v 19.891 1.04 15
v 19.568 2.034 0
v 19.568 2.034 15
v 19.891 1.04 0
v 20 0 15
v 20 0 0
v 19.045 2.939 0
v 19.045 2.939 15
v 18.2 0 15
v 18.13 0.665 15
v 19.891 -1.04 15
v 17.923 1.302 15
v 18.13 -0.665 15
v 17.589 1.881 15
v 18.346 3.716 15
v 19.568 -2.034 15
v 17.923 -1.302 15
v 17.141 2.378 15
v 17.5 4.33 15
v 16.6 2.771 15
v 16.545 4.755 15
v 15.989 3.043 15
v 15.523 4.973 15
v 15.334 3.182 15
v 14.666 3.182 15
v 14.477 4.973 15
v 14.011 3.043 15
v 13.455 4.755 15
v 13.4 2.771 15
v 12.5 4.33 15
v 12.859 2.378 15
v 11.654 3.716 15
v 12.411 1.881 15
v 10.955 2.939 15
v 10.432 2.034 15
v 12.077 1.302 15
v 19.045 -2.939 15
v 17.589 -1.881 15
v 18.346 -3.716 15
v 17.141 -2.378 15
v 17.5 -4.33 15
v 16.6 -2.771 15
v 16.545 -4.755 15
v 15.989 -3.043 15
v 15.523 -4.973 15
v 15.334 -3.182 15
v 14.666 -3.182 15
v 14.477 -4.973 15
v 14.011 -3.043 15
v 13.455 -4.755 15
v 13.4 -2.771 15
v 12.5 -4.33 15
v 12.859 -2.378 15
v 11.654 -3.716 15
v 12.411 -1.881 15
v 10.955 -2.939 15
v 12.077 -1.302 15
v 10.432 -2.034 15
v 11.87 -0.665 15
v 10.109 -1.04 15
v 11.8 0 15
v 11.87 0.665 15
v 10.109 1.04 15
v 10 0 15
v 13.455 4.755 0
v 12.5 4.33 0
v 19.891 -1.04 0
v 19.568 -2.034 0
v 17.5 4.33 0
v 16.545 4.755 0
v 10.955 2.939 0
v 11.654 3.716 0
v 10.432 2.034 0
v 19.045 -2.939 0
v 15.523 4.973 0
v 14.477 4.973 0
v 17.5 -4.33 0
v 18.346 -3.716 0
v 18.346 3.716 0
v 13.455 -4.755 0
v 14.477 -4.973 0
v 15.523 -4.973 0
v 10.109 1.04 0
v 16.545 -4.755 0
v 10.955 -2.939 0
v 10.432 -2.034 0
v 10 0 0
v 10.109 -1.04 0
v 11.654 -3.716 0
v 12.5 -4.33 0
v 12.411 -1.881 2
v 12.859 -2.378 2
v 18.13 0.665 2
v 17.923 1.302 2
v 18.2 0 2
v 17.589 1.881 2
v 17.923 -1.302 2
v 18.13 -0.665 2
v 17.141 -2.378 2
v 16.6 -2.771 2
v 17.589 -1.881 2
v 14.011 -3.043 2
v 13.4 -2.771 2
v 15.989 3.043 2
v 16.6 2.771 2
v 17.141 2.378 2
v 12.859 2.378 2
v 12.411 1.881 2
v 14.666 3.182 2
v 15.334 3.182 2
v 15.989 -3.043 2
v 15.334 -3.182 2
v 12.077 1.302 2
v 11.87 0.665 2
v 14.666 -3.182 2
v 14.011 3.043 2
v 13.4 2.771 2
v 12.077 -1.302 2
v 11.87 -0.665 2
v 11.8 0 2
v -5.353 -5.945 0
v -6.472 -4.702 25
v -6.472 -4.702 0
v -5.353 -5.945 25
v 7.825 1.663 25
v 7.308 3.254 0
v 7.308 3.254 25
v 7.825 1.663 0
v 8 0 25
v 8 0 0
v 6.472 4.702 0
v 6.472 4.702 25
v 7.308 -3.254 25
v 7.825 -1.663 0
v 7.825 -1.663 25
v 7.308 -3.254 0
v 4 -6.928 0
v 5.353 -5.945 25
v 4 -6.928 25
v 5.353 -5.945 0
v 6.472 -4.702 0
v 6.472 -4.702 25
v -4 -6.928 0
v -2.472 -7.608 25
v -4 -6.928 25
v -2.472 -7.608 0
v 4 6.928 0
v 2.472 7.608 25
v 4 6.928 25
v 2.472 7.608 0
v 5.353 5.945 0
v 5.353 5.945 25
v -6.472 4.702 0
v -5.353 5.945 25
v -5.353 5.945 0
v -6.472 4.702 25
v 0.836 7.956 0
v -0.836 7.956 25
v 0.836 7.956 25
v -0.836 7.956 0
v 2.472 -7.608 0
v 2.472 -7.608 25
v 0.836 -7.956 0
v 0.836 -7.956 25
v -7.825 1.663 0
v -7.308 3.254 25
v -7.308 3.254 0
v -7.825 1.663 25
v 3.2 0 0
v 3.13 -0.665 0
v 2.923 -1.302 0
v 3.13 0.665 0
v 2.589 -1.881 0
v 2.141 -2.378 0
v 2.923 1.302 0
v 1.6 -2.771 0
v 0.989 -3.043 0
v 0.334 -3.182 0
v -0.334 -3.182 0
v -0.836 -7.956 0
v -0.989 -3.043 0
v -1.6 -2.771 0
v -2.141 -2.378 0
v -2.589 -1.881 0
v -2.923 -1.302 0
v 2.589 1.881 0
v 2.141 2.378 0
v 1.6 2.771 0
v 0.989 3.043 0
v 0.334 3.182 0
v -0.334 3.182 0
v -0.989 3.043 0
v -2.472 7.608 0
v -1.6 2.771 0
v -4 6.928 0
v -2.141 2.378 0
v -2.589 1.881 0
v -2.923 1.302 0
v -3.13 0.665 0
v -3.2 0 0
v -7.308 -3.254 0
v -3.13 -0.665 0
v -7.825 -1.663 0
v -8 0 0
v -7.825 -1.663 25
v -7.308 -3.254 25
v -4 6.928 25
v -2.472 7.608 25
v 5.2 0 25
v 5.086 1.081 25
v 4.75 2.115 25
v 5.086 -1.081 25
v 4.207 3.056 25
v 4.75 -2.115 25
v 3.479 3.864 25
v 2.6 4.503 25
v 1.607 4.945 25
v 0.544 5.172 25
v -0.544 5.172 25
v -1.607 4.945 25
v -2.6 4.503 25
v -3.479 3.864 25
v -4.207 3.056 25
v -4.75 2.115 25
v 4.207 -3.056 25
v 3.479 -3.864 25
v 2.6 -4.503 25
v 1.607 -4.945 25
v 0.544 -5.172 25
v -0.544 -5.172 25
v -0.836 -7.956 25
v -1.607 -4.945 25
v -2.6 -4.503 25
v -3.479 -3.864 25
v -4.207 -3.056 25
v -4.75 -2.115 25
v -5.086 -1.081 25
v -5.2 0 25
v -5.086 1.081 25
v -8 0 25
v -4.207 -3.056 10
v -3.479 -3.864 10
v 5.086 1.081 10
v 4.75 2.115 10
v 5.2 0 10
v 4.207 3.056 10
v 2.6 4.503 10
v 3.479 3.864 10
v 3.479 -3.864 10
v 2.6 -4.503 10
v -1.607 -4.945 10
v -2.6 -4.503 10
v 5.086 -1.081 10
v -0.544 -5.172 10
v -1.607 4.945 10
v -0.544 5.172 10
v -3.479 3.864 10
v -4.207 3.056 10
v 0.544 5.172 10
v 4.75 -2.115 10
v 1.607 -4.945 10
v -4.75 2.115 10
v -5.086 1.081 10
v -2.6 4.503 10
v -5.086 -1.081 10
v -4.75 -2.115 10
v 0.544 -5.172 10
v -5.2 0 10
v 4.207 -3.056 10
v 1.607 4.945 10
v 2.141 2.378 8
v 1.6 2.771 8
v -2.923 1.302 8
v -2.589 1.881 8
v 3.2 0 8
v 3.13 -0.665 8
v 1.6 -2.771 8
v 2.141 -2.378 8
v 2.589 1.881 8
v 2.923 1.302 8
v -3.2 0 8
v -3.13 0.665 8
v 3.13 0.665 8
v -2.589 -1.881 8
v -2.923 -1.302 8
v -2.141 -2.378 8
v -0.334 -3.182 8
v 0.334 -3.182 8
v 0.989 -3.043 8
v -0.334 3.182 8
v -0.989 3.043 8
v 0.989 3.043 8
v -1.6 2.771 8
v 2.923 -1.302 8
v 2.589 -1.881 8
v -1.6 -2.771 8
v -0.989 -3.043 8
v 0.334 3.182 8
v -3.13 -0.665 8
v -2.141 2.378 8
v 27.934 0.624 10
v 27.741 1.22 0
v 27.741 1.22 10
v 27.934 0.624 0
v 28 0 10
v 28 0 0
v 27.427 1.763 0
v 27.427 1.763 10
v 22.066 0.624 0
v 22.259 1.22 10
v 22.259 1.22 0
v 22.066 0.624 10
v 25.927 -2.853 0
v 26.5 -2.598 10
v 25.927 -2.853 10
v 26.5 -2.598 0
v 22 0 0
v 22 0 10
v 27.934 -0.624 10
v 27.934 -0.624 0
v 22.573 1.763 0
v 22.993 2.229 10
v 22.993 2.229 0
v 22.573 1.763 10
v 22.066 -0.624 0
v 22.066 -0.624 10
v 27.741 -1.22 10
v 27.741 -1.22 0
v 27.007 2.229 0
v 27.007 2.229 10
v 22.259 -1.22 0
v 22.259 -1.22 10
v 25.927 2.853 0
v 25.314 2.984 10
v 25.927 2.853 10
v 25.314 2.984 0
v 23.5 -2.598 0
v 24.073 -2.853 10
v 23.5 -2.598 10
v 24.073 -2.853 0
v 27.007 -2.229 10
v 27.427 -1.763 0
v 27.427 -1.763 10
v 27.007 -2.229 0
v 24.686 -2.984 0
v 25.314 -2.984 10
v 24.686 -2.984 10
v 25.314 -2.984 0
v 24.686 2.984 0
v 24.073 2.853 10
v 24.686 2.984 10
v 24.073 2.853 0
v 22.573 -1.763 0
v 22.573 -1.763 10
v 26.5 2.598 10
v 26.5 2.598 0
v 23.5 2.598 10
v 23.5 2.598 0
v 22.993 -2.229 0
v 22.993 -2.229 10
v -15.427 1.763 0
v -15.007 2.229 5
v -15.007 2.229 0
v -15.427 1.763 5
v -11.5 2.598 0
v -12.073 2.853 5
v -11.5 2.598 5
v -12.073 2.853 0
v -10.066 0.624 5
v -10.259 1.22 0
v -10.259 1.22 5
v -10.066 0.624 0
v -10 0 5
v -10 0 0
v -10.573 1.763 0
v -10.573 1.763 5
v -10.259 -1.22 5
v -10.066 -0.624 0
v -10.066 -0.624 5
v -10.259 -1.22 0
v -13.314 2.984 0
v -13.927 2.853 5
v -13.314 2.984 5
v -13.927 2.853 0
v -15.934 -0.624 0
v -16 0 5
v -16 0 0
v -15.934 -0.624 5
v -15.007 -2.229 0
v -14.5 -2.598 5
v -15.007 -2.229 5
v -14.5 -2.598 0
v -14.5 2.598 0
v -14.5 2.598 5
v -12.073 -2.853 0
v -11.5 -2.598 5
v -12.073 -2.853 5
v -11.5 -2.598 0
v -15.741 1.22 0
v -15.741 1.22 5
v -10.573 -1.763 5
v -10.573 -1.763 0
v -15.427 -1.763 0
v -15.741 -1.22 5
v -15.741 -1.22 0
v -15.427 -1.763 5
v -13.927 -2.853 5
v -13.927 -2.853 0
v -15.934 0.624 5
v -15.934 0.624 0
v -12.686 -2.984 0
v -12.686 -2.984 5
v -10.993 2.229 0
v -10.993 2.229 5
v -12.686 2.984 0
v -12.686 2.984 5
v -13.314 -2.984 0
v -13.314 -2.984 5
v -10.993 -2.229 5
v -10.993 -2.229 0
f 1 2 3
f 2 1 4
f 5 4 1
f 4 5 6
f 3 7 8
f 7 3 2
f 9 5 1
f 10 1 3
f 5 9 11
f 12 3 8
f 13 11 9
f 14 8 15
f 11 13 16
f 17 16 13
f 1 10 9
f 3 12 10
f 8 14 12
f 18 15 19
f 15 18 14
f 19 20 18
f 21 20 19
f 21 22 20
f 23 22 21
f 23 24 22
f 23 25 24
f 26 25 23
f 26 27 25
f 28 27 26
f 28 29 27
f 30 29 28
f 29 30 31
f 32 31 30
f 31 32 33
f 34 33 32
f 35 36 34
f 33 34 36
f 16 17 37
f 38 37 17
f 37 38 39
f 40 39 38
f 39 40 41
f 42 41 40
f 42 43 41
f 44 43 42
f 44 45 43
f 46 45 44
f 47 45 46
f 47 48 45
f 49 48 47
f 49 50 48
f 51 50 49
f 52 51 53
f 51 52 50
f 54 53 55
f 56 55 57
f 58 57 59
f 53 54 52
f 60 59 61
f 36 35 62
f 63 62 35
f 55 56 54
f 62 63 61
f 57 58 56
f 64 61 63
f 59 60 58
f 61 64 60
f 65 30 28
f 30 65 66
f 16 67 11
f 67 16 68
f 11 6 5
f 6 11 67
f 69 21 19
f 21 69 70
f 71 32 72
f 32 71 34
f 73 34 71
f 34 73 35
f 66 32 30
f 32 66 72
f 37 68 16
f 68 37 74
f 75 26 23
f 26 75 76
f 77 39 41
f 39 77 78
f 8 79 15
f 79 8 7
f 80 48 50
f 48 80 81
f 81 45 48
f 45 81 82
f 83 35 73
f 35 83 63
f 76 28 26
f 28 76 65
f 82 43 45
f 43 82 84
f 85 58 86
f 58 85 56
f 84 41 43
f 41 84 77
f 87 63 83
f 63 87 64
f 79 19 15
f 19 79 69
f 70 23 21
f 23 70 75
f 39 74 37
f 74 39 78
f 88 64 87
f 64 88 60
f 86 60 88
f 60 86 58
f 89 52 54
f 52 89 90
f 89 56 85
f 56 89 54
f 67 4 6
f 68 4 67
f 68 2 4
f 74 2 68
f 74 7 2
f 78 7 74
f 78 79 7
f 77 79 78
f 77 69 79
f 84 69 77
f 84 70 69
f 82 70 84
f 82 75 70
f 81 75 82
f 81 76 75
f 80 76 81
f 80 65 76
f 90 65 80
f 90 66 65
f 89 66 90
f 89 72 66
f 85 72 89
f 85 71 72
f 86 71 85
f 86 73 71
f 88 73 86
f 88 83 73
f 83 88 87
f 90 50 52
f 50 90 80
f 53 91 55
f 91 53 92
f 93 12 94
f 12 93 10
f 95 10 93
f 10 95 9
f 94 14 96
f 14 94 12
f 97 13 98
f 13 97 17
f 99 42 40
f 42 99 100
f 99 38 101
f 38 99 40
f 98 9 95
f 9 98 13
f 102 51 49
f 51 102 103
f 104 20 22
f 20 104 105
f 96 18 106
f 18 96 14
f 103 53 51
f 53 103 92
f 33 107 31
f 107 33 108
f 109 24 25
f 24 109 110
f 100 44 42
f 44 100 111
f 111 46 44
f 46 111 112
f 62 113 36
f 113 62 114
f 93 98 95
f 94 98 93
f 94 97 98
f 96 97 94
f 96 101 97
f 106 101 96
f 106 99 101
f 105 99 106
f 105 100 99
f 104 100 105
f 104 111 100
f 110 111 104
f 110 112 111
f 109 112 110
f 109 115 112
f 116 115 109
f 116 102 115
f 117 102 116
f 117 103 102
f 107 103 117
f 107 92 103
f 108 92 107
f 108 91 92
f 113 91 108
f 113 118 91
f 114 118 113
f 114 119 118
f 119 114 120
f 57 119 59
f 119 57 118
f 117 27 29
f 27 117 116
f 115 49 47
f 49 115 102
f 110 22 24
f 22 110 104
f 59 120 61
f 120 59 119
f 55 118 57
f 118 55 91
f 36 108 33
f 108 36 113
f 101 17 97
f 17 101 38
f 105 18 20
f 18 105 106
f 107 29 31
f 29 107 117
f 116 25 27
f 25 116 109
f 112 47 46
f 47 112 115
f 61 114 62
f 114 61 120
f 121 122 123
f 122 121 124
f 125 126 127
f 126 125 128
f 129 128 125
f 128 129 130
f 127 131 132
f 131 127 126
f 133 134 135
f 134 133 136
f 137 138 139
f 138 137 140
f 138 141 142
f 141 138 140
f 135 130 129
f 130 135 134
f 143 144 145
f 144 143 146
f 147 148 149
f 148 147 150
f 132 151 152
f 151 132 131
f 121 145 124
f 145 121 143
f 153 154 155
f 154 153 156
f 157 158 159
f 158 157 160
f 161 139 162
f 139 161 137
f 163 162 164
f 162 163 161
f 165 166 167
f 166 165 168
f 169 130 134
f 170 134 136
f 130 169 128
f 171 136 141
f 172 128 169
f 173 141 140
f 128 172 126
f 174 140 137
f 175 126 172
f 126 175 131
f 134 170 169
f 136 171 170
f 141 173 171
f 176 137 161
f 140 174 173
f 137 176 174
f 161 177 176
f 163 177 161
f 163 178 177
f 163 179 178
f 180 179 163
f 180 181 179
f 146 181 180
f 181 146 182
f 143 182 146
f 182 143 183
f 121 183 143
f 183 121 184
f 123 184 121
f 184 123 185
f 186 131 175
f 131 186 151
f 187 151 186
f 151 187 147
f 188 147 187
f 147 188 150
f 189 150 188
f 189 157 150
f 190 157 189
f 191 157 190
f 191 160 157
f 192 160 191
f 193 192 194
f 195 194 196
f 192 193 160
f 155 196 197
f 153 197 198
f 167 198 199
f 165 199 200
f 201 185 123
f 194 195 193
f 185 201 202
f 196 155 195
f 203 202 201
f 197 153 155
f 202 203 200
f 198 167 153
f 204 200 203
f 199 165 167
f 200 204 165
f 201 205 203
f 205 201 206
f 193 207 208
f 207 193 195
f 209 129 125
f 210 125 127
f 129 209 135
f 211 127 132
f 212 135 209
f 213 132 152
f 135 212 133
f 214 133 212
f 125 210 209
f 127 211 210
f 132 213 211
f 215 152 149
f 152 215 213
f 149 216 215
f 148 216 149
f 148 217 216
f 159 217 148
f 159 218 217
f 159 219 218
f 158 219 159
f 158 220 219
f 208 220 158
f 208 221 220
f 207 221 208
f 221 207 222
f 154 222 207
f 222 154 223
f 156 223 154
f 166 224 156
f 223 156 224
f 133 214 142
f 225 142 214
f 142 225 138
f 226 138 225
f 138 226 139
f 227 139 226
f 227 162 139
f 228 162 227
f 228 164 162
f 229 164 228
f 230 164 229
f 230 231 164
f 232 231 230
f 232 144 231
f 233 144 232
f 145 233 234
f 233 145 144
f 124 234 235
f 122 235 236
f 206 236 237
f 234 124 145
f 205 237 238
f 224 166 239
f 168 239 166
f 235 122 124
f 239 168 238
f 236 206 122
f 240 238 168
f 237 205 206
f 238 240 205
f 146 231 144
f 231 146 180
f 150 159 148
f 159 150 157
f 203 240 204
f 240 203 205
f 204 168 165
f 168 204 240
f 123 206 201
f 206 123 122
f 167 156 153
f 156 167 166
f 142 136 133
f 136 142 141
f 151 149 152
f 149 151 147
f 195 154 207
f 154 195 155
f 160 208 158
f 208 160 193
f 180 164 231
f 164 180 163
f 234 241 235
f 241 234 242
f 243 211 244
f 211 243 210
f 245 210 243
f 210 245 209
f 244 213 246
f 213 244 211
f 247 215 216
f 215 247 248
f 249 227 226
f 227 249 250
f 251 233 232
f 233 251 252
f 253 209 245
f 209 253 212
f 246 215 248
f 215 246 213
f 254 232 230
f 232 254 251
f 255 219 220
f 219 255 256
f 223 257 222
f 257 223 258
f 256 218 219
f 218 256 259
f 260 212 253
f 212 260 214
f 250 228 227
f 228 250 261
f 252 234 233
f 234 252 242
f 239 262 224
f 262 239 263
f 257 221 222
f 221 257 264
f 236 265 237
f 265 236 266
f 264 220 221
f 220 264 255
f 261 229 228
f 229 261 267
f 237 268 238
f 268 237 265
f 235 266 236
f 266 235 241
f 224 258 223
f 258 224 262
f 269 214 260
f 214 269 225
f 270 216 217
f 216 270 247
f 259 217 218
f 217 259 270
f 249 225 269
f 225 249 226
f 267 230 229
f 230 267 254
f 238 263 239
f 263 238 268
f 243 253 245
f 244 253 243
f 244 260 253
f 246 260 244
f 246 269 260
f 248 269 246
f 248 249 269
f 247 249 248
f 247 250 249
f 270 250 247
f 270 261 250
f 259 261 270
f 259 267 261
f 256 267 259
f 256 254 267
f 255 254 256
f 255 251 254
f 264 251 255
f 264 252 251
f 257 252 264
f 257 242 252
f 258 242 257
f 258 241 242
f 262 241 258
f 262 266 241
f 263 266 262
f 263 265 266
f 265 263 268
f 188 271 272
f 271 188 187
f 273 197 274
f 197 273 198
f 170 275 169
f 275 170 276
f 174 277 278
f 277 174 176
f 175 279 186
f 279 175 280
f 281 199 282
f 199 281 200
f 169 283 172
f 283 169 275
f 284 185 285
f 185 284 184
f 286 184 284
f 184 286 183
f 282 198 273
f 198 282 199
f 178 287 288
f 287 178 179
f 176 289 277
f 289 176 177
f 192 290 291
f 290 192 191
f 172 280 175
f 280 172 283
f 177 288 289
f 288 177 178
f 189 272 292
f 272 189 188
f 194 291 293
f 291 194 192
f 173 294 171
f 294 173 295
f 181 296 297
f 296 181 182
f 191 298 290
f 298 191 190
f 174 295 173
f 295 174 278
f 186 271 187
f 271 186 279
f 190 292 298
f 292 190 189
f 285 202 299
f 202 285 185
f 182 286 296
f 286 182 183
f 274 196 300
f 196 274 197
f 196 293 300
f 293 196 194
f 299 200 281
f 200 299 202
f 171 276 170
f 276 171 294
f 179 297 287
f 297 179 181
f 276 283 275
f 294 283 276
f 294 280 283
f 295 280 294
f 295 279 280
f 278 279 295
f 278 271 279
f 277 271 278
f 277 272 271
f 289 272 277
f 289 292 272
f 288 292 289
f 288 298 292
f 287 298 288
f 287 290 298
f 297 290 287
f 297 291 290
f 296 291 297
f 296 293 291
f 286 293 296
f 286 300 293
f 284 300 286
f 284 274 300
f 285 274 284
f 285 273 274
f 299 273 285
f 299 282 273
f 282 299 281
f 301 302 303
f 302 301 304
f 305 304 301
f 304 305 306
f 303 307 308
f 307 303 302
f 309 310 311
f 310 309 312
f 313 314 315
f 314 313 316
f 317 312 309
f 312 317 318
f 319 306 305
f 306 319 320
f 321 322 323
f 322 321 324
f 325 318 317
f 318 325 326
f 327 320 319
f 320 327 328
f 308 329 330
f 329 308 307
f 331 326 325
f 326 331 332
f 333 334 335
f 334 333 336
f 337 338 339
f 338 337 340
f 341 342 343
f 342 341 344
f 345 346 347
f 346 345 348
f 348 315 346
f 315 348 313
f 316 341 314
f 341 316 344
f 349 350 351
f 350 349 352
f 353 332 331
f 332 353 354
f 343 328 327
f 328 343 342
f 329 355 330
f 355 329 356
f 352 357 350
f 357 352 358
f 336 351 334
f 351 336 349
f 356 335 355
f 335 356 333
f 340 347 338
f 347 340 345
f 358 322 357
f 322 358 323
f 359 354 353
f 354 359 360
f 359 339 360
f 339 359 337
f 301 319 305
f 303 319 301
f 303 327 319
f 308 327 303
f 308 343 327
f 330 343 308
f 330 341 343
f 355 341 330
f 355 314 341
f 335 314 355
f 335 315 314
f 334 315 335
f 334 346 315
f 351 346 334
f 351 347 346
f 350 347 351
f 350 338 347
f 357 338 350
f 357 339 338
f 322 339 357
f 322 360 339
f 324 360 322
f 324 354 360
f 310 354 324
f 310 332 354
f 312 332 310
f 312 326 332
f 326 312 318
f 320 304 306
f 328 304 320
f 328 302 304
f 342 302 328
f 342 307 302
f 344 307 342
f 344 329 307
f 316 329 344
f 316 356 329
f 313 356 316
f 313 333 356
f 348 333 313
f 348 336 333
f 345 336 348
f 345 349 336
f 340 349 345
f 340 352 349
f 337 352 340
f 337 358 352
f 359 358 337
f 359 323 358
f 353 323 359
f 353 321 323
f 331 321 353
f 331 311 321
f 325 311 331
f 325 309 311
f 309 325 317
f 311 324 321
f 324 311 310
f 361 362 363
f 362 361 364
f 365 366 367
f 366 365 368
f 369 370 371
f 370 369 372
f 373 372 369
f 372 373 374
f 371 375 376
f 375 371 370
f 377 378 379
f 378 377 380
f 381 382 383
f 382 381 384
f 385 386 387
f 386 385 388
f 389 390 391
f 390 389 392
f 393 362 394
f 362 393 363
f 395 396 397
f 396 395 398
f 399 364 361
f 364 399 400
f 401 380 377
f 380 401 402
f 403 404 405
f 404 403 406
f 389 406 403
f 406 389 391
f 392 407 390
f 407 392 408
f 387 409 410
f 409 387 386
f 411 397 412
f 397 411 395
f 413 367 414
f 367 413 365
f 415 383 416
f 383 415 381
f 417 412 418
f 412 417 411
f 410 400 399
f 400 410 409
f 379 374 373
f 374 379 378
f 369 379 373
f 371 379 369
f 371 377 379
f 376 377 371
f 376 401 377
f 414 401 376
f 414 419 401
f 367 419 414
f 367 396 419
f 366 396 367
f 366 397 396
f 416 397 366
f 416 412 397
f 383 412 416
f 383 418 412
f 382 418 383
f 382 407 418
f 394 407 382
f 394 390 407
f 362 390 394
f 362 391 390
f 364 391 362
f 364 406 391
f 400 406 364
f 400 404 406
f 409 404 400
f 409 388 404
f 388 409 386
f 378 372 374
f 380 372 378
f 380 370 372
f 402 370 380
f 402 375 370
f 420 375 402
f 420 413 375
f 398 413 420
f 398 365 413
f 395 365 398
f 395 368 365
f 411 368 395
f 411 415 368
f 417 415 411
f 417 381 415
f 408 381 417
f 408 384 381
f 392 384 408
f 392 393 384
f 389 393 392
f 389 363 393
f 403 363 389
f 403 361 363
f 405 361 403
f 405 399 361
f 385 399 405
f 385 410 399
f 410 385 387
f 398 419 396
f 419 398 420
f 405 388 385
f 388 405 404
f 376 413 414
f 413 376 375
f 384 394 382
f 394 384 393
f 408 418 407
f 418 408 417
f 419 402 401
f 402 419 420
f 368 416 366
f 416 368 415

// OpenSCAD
// Custom magnetic spring
// By Magonegro JUL-2016
// Uses two cylindrical magnets placed in opposite magnetic orientation.
// Depending on the strength of the magnets the spring lenght may vary.
// Insert the magnets and top in the piston and holder and fix them with glue
// You have a working everlasting magnetic spring.

// Piston parameters
// Radius for the piston:
RADIUS_IN=5;
// Height of the piston:
HEIGHT_IN=15;
// Magnet height
MAGHEIGHT=3;
// Magnet radius
MAGRADIUS=3;
// Holder radius:
RADIUS_OUT=8;
// Holder height
HEIGHT_OUT=25;
// Holder base height
BASEHEIGHT_OUT=10;
// Resolution
FACETS=30;
// Tolerance (0.2mm typ)
TOLERANCE=0.2;

// Piston
translate([RADIUS_OUT+RADIUS_IN+2,0,0]) 
    {
    difference()
        {
        cylinder(r=RADIUS_IN,h=HEIGHT_IN,$fn=FACETS);
        translate([0,0,2]) cylinder(r=MAGRADIUS+TOLERANCE,h=HEIGHT_IN-2,$fn=FACETS);
        }
    }

// Part to fix the magnet to the piston
translate([RADIUS_OUT+2*RADIUS_IN+2+MAGRADIUS+2,0,0])
    {
    cylinder(r=MAGRADIUS,h=HEIGHT_IN-2-MAGHEIGHT,$fn=FACETS);
    }

// Holder
union()
{
    difference()
    {
        cylinder(r=RADIUS_OUT,h=HEIGHT_OUT,$fn=FACETS);
        cylinder(r=RADIUS_IN+TOLERANCE,h=HEIGHT_OUT,$fn=FACETS);
    }
    difference()
    {
    cylinder(r=RADIUS_OUT,h=BASEHEIGHT_OUT,$fn=FACETS);
    cylinder(r=MAGRADIUS+TOLERANCE,h=BASEHEIGHT_OUT-2,$fn=FACETS);
    }
}

// To fix the magnet to the holder
translate([-RADIUS_OUT-MAGRADIUS-2,0,0])
    {
    cylinder(r=MAGRADIUS,h=BASEHEIGHT_OUT-2-MAGHEIGHT,$fn=FACETS);
    }
